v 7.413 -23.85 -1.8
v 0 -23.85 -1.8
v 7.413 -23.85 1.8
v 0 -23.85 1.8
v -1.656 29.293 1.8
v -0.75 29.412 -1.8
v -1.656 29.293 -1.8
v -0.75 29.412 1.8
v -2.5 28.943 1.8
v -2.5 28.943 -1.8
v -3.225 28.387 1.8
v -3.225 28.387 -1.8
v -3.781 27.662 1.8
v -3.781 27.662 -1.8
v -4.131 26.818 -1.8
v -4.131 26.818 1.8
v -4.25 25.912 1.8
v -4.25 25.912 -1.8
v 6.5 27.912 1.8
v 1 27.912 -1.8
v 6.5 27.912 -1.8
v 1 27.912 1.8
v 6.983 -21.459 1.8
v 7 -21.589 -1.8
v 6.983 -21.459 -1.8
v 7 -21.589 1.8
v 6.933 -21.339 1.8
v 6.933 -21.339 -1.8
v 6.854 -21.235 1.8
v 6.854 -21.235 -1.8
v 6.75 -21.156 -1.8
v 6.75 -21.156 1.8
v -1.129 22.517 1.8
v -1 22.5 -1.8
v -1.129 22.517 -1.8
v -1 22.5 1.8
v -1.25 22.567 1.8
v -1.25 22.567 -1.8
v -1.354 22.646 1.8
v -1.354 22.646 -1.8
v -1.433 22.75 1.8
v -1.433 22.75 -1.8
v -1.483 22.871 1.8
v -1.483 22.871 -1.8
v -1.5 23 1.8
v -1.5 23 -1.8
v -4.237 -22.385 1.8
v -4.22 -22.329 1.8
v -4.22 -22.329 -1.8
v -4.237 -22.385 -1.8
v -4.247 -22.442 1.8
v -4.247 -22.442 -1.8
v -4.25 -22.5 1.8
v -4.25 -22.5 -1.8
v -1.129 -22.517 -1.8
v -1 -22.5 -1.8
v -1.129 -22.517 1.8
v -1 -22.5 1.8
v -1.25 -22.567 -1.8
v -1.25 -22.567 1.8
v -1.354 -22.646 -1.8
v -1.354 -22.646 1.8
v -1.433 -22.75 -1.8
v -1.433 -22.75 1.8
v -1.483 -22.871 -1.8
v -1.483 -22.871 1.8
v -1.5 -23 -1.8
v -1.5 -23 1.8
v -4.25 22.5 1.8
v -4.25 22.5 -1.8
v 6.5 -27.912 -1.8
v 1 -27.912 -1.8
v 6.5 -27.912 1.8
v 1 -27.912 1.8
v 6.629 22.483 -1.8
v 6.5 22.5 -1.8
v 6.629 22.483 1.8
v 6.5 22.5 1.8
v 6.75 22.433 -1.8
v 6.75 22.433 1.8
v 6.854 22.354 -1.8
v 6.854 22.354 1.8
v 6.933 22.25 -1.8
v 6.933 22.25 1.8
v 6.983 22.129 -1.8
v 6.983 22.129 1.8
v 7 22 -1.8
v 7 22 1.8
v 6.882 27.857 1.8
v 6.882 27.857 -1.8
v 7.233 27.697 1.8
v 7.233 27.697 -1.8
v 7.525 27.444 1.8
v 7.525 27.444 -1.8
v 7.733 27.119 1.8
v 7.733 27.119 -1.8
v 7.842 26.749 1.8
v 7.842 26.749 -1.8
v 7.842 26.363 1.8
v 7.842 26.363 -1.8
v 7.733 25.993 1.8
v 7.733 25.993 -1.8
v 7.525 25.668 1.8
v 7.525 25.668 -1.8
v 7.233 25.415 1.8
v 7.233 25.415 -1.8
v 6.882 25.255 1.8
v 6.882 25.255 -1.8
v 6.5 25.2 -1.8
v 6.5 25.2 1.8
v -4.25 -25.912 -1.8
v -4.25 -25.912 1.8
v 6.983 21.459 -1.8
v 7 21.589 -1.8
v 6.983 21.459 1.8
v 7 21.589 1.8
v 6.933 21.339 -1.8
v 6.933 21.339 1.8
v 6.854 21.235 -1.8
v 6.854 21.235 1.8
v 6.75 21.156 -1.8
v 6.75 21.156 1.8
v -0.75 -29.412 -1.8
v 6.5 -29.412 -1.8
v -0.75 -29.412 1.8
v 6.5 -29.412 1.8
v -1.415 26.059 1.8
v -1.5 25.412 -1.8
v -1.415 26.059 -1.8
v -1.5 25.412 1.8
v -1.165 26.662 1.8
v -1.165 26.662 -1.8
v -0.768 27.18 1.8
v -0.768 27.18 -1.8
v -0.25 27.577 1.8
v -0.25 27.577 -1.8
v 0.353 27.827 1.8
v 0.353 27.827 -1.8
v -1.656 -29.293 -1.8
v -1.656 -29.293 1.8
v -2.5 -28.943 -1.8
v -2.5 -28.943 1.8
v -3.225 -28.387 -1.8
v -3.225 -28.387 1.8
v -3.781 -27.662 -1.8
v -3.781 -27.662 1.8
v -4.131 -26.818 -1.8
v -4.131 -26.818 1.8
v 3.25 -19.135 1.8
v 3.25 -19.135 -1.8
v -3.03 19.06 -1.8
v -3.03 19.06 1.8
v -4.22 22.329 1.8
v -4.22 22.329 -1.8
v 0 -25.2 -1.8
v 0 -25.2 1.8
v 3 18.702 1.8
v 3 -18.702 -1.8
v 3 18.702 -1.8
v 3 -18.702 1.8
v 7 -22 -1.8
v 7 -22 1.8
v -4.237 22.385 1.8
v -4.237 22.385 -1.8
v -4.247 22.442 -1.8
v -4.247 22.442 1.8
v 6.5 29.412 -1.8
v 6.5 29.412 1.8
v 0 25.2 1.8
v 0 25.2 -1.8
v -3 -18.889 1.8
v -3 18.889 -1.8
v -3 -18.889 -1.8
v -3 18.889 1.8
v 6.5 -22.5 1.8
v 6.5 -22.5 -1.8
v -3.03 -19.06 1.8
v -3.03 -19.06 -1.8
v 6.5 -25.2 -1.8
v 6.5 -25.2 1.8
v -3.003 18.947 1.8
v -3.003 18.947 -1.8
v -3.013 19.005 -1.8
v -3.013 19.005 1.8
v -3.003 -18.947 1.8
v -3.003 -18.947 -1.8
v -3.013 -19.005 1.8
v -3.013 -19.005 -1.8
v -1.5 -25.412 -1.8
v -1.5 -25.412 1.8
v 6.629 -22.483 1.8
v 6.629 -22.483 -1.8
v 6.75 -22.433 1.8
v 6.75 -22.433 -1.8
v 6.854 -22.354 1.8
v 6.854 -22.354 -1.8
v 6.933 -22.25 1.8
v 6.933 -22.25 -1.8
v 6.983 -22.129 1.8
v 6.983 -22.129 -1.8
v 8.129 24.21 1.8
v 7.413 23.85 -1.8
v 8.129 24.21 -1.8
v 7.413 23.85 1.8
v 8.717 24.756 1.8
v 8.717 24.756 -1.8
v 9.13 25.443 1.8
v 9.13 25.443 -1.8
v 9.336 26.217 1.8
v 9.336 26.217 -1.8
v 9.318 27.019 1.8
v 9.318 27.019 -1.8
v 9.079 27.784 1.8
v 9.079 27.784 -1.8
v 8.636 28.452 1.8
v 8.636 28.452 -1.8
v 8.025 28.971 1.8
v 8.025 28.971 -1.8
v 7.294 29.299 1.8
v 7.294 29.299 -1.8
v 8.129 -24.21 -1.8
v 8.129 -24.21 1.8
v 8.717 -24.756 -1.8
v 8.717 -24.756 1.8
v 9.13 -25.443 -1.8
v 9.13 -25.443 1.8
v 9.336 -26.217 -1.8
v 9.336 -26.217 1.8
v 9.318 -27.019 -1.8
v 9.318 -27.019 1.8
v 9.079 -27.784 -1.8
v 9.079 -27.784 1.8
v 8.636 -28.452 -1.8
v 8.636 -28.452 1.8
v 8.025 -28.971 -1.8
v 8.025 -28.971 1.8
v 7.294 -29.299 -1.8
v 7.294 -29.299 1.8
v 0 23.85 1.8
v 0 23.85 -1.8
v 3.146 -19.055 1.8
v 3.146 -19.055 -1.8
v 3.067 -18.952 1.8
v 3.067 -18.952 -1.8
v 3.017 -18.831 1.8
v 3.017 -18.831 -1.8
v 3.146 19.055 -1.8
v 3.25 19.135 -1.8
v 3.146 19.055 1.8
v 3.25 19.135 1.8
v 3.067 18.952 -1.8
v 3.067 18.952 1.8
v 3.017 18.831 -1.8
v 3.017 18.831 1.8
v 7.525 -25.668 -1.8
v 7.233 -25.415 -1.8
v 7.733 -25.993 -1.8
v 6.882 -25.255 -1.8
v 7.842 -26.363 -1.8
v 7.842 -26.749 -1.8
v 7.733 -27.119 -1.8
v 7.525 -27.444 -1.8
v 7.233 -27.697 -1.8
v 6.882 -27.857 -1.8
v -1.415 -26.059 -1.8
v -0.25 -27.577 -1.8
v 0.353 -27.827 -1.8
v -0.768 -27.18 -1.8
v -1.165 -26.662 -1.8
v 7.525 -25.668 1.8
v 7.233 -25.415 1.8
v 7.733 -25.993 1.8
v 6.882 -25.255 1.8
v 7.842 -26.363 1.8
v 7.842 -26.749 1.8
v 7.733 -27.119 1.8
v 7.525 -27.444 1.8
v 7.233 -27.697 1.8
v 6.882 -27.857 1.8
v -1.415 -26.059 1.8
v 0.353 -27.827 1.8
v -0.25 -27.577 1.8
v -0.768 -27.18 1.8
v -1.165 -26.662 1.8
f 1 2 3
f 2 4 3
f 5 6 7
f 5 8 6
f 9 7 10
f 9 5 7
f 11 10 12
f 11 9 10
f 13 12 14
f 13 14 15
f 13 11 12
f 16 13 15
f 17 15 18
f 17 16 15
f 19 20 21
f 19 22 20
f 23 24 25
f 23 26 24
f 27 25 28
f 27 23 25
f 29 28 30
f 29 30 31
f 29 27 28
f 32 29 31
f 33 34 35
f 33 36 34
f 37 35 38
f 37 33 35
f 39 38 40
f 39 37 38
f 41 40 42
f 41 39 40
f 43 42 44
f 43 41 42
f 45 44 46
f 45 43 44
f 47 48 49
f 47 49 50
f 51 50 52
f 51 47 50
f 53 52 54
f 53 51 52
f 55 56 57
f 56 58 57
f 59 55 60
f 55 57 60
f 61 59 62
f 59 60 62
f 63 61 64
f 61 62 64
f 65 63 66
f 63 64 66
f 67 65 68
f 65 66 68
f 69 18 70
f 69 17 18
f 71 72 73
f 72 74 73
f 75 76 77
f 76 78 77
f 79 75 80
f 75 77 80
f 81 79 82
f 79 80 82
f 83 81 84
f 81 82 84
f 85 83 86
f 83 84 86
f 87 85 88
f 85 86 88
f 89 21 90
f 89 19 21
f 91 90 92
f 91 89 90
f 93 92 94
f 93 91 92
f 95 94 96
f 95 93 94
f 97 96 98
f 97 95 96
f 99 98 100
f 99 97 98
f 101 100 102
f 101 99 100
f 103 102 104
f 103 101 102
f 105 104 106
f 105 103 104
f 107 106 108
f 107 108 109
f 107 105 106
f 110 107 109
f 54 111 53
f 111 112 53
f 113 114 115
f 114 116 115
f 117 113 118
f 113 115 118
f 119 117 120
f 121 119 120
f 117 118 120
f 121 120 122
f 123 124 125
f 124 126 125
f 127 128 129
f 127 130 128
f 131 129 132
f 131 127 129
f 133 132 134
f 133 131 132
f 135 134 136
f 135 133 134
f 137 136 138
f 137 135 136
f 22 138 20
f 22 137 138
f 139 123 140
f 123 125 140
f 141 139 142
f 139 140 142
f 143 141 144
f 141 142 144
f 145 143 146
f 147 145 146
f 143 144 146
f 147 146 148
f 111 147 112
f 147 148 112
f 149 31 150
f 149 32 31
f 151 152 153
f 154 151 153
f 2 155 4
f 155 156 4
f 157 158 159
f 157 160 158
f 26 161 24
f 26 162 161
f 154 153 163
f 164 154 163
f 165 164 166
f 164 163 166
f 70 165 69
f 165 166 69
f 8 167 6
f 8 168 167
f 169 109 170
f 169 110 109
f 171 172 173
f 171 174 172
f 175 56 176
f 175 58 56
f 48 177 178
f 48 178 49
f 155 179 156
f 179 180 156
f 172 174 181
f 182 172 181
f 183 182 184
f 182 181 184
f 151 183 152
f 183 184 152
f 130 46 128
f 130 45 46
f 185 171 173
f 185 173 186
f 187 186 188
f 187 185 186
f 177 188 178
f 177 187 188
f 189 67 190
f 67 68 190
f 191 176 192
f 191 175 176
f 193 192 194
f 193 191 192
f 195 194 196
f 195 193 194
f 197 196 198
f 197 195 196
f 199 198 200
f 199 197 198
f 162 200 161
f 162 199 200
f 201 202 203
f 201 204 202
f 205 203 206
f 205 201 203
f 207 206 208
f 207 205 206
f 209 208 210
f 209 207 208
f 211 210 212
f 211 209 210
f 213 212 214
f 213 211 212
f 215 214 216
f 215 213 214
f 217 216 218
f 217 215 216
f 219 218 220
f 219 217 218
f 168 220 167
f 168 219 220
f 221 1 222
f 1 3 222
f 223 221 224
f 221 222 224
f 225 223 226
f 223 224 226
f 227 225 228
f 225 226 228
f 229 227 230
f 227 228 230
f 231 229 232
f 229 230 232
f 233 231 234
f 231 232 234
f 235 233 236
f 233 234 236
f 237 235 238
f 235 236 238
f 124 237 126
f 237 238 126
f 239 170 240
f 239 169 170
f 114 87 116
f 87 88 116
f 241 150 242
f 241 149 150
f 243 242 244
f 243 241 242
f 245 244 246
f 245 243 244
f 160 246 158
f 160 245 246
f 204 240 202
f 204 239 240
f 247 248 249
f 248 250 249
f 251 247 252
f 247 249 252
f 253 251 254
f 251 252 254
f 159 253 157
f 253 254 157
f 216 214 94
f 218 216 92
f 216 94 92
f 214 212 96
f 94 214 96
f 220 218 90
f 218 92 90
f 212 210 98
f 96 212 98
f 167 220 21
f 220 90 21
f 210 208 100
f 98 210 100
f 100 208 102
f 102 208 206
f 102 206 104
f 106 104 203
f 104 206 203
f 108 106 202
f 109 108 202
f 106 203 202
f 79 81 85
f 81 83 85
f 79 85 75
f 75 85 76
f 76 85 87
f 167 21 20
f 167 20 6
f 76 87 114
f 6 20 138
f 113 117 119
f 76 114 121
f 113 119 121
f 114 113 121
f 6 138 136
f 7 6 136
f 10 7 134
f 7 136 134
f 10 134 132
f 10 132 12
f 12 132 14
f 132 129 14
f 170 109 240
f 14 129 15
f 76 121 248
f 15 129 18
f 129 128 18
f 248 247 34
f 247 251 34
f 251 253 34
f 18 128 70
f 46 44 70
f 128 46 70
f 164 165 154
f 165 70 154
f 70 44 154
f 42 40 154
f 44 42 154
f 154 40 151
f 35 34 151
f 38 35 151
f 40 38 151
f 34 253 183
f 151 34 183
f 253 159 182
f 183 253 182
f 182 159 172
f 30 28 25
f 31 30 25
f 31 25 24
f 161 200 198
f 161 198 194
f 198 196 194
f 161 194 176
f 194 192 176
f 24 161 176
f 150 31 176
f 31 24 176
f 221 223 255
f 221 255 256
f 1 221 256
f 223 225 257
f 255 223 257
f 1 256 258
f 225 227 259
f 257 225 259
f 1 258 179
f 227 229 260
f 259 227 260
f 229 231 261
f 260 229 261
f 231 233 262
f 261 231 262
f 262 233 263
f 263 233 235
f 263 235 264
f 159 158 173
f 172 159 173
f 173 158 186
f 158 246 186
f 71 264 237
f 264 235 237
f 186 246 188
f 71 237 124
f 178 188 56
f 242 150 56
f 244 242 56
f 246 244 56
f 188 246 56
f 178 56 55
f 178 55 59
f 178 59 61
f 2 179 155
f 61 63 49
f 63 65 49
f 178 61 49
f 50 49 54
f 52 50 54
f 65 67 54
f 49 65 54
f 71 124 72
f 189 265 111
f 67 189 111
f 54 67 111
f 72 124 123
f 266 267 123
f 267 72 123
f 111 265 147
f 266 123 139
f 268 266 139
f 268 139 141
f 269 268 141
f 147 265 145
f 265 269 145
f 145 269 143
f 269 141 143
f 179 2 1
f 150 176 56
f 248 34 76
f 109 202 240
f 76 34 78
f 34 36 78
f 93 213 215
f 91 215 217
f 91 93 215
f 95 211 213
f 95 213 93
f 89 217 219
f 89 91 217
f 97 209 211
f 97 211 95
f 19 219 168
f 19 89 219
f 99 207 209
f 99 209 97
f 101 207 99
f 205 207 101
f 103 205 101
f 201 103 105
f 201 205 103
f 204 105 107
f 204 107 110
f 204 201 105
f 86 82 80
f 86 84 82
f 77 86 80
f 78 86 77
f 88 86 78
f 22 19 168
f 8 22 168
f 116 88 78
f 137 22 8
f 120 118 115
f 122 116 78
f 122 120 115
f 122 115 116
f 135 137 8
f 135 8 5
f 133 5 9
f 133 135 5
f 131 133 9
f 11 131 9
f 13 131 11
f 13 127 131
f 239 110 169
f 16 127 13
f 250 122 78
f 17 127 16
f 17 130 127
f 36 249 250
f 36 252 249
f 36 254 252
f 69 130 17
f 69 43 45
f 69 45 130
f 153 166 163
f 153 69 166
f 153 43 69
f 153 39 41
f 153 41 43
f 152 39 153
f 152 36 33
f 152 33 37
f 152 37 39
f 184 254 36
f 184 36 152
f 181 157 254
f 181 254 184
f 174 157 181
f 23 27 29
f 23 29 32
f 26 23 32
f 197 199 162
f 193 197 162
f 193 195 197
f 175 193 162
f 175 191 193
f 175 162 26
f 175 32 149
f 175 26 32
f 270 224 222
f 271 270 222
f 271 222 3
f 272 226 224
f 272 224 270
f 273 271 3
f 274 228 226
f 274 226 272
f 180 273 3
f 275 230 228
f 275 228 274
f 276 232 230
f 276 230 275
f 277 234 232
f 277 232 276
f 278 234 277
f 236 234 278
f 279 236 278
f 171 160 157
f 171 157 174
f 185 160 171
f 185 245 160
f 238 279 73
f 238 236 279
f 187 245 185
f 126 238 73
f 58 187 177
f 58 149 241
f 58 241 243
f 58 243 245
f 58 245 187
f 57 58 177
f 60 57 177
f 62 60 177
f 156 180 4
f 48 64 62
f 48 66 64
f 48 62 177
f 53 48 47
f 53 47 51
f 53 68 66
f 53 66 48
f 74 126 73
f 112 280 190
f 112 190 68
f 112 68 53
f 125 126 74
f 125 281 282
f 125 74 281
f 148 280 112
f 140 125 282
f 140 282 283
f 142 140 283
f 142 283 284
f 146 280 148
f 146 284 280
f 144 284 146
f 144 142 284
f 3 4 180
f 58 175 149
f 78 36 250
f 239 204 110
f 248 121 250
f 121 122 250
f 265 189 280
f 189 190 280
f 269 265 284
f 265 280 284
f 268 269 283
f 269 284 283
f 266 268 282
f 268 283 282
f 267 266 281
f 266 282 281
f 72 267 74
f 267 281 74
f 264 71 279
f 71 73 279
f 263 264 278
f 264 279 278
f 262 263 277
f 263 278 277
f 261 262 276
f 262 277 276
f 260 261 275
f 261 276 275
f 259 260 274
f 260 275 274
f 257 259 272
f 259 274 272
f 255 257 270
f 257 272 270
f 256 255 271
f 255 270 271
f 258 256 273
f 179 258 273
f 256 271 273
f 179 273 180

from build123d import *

# Parameters (mm, degrees)
BOSS_EXTRUDE1_DEPTH = 1.8


with BuildPart() as part:
    # Sketch1 → Boss-Extrude1 (new, symmetric)
    with BuildSketch(Plane.XY):
        with BuildLine():
            ThreePointArc((-4.21984631, 22.328989928), (-4.242403877, 22.413175911), (-4.25, 22.5))
            Line((-4.25, 22.5), (-1, 22.5))
            Line((-1, 22.5), (6.5, 22.5))
            ThreePointArc((6.5, 22.5), (6.853553391, 22.353553391), (7, 22))
            Line((7, 22), (7, 21.588675135))
            ThreePointArc((7, 21.588675135), (6.933012702, 21.338675135), (6.75, 21.155662433))
            Line((6.75, 21.155662433), (3.25, 19.134936491))
            ThreePointArc((3.25, 19.134936491), (3.066987298, 18.951923789), (3, 18.701923789))
            Line((3, 18.701923789), (3, 0))
            Line((3, 0), (0, 0))
            Line((0, 0), (-3, 0))
            Line((-3, 0), (-3, 18.889326245))
            ThreePointArc((-3, 18.889326245), (-3.007596123, 18.976150334), (-3.03015369, 19.060336317))
            Line((-3.03015369, 19.060336317), (-4.21984631, 22.328989928))
        make_face()
        with BuildLine():
            Line((-4.25, 23.85), (-4.25, 22.5))
            Line((-4.25, 22.5), (-1, 22.5))
            ThreePointArc((-1, 22.5), (-1.353553391, 22.646446609), (-1.5, 23))
            Line((-1.5, 23), (-1.5, 23.85))
            Line((-1.5, 23.85), (-4.25, 23.85))
        make_face()
        with BuildLine():
            Line((-4.25, 25.91183651), (-4.25, 23.85))
            Line((-4.25, 23.85), (-1.5, 23.85))
            Line((-1.5, 23.85), (-1.5, 25.41183651))
            ThreePointArc((-1.5, 25.41183651), (-0.767766953, 27.179603463), (1, 27.91183651))
            Line((1, 27.91183651), (6.5, 27.91183651))
            ThreePointArc((6.5, 27.91183651), (7.855918255, 26.555918255), (6.5, 25.2))
            Line((6.5, 25.2), (0, 25.2))
            Line((0, 25.2), (0, 23.85))
            Line((0, 23.85), (7.413386816, 23.85))
            ThreePointArc((7.413386816, 23.85), (9.318168769, 27.01872909), (6.5, 29.41183651))
            Line((6.5, 29.41183651), (-0.75, 29.41183651))
            ThreePointArc((-0.75, 29.41183651), (-3.224873734, 28.386710244), (-4.25, 25.91183651))
        make_face()
    extrude(amount=BOSS_EXTRUDE1_DEPTH, both=True)

    # Mirror1: part across plane


with BuildPart() as part_1:
    add(part.part)
    add(part.part.mirror(Plane.ZX))


solid = part_1.part
